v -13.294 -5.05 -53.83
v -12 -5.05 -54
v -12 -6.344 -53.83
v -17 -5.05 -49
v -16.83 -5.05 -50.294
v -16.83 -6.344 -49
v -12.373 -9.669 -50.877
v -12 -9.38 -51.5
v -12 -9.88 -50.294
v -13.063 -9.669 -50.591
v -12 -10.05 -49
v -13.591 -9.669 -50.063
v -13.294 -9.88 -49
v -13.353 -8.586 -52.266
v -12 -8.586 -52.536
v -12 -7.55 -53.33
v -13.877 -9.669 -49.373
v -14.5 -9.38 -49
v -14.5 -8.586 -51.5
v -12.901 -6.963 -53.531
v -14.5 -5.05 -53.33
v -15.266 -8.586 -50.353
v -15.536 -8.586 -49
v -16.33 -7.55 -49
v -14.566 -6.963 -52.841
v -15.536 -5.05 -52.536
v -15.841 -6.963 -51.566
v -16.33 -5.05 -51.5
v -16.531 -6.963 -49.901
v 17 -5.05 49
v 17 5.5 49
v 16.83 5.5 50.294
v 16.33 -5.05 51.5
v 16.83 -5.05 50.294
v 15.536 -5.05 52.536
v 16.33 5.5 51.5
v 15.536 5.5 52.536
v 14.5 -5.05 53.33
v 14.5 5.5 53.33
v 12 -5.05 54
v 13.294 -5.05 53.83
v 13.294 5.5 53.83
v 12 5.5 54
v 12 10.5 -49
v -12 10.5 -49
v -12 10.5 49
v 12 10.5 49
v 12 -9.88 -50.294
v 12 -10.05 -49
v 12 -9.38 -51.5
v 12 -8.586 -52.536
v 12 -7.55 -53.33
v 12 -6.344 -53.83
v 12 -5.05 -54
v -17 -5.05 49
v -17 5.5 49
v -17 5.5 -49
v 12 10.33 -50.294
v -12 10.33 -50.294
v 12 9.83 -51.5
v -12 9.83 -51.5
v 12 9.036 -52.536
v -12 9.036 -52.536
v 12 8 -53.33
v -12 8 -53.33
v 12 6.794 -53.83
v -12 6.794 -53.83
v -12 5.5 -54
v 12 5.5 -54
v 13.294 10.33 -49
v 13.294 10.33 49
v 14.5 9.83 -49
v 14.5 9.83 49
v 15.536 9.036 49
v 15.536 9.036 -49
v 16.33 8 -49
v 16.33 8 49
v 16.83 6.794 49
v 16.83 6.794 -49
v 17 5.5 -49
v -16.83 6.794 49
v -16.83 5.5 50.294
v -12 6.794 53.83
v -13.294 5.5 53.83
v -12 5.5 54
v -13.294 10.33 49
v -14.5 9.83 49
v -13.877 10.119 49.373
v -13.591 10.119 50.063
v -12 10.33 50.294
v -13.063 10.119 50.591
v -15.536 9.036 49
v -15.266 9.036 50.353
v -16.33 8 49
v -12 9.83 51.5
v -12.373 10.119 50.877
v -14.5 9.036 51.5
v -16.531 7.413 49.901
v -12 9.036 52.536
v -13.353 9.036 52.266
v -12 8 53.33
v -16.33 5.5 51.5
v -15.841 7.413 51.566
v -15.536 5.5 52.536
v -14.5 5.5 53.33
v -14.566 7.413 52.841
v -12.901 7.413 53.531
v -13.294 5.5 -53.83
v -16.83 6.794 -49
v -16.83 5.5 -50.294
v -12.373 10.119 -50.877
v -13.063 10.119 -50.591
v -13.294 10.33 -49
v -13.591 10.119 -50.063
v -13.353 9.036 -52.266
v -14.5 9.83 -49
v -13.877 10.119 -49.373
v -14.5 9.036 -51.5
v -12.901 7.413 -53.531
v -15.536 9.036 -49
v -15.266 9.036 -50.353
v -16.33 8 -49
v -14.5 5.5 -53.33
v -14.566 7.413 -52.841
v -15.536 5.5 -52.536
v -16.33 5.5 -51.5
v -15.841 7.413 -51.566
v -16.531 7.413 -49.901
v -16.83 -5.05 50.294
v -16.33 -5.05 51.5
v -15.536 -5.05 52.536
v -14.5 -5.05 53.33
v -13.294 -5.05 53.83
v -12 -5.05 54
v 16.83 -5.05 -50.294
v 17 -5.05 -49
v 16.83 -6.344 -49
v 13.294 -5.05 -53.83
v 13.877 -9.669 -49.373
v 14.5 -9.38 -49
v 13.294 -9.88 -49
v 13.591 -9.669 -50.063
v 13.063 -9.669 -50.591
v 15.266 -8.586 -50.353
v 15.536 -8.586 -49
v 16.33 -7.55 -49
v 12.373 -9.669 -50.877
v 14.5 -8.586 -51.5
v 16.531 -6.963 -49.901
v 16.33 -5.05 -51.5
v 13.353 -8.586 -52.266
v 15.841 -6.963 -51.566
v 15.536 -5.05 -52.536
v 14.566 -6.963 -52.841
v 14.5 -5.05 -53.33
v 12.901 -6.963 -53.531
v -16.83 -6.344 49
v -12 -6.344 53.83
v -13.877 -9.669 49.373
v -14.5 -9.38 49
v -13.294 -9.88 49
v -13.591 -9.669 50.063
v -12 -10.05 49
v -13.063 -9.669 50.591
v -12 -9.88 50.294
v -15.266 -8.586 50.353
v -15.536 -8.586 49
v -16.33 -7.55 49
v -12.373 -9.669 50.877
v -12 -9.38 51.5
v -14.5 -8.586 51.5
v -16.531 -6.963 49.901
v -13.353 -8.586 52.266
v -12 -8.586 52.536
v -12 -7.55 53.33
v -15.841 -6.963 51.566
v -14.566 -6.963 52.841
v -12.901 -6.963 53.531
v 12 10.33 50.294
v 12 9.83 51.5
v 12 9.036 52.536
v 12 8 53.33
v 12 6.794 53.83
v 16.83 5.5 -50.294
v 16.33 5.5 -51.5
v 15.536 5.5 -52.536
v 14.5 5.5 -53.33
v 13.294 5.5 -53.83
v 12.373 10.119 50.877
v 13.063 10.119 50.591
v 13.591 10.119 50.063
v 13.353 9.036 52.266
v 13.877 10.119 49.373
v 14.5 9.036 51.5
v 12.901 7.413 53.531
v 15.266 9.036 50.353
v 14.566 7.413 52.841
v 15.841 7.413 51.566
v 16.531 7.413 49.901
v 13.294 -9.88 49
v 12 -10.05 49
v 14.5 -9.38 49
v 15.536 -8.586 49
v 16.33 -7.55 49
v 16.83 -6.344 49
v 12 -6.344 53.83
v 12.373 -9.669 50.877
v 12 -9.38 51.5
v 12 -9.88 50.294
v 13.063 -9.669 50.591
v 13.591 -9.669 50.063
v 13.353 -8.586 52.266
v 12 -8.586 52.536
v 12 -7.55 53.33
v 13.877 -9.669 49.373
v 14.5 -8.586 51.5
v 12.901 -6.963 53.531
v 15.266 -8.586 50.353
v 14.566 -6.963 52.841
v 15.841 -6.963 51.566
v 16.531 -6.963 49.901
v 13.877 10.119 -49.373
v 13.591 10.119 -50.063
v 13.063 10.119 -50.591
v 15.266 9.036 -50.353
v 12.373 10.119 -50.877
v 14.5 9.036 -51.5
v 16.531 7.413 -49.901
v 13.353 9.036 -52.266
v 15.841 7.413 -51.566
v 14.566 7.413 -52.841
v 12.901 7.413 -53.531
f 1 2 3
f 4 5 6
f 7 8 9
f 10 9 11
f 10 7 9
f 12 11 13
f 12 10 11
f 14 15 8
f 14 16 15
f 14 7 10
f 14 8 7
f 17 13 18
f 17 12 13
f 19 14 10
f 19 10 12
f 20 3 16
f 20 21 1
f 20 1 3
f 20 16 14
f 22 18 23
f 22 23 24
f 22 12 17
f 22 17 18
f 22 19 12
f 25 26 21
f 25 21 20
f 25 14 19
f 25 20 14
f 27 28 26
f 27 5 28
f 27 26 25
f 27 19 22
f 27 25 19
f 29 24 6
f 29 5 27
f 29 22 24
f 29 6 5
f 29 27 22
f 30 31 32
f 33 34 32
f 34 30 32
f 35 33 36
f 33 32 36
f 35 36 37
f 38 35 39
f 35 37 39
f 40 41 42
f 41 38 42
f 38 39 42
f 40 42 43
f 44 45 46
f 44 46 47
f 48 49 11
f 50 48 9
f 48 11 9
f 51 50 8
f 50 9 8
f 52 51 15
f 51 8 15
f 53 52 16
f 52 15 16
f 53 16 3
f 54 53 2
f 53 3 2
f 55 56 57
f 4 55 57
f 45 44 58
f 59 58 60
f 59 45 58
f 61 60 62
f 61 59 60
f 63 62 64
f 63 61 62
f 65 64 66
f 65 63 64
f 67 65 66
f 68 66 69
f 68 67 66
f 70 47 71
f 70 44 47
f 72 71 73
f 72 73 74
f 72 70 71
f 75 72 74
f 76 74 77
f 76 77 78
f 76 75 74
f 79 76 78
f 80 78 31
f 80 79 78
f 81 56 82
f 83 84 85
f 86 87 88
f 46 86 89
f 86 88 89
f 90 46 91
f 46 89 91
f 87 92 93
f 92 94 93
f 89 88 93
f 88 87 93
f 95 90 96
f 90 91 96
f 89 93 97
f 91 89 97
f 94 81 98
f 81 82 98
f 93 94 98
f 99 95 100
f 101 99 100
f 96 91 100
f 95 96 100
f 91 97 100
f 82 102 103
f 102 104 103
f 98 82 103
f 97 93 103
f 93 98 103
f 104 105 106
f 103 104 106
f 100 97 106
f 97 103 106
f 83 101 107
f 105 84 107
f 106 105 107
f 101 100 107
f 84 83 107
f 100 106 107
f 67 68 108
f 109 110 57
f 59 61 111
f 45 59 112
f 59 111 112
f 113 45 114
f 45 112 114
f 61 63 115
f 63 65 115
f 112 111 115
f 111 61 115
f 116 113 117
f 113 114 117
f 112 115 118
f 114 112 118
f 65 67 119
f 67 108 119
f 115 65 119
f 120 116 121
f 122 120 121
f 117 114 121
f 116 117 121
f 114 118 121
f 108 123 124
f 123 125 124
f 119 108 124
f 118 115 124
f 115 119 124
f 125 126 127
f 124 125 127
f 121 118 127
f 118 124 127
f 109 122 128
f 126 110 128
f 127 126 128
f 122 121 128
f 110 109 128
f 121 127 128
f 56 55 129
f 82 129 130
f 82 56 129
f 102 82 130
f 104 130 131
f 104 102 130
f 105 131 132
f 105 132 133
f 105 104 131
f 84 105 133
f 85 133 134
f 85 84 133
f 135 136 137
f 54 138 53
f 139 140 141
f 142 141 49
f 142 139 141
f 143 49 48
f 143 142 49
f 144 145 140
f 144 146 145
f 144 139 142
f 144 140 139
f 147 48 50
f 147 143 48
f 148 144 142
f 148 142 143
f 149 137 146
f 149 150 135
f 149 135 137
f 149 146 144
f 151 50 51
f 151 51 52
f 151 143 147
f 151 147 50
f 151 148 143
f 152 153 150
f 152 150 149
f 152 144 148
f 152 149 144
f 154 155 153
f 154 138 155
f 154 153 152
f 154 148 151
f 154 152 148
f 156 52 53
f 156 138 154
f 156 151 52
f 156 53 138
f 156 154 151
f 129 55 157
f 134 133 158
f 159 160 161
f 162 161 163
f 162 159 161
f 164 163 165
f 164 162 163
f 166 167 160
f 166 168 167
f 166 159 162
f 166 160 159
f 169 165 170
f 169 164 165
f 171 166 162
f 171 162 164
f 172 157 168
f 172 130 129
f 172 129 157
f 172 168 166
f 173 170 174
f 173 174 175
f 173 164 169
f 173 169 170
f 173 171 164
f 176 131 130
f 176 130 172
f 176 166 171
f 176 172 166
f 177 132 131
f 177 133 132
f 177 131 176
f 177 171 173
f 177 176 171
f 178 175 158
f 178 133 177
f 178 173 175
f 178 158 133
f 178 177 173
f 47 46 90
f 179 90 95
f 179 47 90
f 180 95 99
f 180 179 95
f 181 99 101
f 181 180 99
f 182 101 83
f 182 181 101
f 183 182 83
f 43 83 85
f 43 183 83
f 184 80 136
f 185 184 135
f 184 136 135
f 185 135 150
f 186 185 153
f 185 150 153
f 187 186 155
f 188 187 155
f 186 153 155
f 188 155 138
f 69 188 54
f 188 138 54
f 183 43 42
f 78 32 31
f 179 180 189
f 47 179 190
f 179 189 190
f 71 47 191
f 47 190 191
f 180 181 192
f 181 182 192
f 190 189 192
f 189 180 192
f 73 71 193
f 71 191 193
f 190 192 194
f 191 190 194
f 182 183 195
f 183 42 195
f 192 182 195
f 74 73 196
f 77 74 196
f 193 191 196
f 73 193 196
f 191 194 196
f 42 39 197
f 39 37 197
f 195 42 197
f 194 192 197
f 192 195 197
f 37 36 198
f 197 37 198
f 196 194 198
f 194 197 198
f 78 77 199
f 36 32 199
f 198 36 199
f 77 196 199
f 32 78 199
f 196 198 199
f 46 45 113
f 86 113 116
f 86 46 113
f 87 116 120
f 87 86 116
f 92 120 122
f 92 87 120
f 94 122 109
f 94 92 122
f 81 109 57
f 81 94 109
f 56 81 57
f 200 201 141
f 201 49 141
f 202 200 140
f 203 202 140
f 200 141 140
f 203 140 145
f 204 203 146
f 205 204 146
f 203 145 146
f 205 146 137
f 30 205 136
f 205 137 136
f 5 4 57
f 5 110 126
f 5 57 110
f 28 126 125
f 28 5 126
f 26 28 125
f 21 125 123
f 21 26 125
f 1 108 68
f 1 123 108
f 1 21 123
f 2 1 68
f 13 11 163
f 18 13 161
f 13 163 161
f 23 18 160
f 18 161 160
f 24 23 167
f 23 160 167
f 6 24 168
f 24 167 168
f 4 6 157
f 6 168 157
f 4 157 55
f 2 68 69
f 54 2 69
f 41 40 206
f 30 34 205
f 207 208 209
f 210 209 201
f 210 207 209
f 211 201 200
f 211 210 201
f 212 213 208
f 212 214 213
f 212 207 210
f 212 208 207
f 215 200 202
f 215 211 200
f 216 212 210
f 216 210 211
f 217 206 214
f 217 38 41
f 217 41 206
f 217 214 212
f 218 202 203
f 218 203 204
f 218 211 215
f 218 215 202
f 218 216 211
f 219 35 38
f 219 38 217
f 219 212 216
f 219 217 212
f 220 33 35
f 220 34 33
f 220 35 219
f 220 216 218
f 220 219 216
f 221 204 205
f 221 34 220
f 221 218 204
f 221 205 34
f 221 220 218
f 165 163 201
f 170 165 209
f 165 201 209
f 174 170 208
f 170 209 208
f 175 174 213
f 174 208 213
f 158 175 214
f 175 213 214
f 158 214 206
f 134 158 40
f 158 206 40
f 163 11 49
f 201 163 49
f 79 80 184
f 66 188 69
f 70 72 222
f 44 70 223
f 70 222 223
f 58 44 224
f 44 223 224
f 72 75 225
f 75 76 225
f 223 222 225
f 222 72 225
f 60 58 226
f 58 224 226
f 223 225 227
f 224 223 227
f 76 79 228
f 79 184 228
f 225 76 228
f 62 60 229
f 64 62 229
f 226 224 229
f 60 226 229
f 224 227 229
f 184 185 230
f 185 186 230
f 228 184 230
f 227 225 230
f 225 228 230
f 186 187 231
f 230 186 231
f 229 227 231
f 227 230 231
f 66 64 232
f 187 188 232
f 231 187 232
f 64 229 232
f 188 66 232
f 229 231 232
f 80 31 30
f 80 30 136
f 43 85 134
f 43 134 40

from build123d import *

# Parameters (mm, degrees)
ESQUISSE1_W             = 34
ESQUISSE1_H             = 108
BOSS_EXTRU_1_DEPTH      = 10.5
BOSS_EXTRU_1_DEPTH_BACK = 10.05
CONG_1_R                = 5
CONG_2_R                = 5


with BuildPart() as part:
    # Esquisse1 → Boss.-Extru.1 (new body, two sides)
    with BuildSketch(Plane(origin=(0, 0, 0), x_dir=(1, 0, 0), z_dir=(0, 1, 0))) as boss_extru_1_sk:
        Rectangle(ESQUISSE1_W, ESQUISSE1_H)
    extrude(amount=BOSS_EXTRU_1_DEPTH)
    extrude(boss_extru_1_sk.sketch, amount=-BOSS_EXTRU_1_DEPTH_BACK)

    # Congé1
    cong_1_edges = [part.edges().sort_by_distance(p)[0] for p in [
        (17, 0.225, 54),
        (-17, 0.225, 54),
        (-17, 0.225, -54),
        (17, 0.225, -54),
    ]]
    fillet(cong_1_edges, radius=CONG_1_R)

    # Congé2
    cong_2_edges = [part.edges().sort_by_distance(p)[0] for p in [
        (17, 10.5, 0),
        (17, -10.05, 0),
        (0, 10.5, -54),
        (-17, 10.5, 0),
        (0, 10.5, 54),
        (15.535533906, 10.5, 52.535533906),
        (-15.535533906, 10.5, 52.535533906),
        (-15.535533906, 10.5, -52.535533906),
        (15.535533906, 10.5, -52.535533906),
        (0, -10.05, -54),
        (0, -10.05, 54),
        (-17, -10.05, 0),
        (15.535533906, -10.05, 52.535533906),
        (-15.535533906, -10.05, 52.535533906),
        (-15.535533906, -10.05, -52.535533906),
        (15.535533906, -10.05, -52.535533906),
    ]]
    fillet(cong_2_edges, radius=CONG_2_R)


solid = part.part
